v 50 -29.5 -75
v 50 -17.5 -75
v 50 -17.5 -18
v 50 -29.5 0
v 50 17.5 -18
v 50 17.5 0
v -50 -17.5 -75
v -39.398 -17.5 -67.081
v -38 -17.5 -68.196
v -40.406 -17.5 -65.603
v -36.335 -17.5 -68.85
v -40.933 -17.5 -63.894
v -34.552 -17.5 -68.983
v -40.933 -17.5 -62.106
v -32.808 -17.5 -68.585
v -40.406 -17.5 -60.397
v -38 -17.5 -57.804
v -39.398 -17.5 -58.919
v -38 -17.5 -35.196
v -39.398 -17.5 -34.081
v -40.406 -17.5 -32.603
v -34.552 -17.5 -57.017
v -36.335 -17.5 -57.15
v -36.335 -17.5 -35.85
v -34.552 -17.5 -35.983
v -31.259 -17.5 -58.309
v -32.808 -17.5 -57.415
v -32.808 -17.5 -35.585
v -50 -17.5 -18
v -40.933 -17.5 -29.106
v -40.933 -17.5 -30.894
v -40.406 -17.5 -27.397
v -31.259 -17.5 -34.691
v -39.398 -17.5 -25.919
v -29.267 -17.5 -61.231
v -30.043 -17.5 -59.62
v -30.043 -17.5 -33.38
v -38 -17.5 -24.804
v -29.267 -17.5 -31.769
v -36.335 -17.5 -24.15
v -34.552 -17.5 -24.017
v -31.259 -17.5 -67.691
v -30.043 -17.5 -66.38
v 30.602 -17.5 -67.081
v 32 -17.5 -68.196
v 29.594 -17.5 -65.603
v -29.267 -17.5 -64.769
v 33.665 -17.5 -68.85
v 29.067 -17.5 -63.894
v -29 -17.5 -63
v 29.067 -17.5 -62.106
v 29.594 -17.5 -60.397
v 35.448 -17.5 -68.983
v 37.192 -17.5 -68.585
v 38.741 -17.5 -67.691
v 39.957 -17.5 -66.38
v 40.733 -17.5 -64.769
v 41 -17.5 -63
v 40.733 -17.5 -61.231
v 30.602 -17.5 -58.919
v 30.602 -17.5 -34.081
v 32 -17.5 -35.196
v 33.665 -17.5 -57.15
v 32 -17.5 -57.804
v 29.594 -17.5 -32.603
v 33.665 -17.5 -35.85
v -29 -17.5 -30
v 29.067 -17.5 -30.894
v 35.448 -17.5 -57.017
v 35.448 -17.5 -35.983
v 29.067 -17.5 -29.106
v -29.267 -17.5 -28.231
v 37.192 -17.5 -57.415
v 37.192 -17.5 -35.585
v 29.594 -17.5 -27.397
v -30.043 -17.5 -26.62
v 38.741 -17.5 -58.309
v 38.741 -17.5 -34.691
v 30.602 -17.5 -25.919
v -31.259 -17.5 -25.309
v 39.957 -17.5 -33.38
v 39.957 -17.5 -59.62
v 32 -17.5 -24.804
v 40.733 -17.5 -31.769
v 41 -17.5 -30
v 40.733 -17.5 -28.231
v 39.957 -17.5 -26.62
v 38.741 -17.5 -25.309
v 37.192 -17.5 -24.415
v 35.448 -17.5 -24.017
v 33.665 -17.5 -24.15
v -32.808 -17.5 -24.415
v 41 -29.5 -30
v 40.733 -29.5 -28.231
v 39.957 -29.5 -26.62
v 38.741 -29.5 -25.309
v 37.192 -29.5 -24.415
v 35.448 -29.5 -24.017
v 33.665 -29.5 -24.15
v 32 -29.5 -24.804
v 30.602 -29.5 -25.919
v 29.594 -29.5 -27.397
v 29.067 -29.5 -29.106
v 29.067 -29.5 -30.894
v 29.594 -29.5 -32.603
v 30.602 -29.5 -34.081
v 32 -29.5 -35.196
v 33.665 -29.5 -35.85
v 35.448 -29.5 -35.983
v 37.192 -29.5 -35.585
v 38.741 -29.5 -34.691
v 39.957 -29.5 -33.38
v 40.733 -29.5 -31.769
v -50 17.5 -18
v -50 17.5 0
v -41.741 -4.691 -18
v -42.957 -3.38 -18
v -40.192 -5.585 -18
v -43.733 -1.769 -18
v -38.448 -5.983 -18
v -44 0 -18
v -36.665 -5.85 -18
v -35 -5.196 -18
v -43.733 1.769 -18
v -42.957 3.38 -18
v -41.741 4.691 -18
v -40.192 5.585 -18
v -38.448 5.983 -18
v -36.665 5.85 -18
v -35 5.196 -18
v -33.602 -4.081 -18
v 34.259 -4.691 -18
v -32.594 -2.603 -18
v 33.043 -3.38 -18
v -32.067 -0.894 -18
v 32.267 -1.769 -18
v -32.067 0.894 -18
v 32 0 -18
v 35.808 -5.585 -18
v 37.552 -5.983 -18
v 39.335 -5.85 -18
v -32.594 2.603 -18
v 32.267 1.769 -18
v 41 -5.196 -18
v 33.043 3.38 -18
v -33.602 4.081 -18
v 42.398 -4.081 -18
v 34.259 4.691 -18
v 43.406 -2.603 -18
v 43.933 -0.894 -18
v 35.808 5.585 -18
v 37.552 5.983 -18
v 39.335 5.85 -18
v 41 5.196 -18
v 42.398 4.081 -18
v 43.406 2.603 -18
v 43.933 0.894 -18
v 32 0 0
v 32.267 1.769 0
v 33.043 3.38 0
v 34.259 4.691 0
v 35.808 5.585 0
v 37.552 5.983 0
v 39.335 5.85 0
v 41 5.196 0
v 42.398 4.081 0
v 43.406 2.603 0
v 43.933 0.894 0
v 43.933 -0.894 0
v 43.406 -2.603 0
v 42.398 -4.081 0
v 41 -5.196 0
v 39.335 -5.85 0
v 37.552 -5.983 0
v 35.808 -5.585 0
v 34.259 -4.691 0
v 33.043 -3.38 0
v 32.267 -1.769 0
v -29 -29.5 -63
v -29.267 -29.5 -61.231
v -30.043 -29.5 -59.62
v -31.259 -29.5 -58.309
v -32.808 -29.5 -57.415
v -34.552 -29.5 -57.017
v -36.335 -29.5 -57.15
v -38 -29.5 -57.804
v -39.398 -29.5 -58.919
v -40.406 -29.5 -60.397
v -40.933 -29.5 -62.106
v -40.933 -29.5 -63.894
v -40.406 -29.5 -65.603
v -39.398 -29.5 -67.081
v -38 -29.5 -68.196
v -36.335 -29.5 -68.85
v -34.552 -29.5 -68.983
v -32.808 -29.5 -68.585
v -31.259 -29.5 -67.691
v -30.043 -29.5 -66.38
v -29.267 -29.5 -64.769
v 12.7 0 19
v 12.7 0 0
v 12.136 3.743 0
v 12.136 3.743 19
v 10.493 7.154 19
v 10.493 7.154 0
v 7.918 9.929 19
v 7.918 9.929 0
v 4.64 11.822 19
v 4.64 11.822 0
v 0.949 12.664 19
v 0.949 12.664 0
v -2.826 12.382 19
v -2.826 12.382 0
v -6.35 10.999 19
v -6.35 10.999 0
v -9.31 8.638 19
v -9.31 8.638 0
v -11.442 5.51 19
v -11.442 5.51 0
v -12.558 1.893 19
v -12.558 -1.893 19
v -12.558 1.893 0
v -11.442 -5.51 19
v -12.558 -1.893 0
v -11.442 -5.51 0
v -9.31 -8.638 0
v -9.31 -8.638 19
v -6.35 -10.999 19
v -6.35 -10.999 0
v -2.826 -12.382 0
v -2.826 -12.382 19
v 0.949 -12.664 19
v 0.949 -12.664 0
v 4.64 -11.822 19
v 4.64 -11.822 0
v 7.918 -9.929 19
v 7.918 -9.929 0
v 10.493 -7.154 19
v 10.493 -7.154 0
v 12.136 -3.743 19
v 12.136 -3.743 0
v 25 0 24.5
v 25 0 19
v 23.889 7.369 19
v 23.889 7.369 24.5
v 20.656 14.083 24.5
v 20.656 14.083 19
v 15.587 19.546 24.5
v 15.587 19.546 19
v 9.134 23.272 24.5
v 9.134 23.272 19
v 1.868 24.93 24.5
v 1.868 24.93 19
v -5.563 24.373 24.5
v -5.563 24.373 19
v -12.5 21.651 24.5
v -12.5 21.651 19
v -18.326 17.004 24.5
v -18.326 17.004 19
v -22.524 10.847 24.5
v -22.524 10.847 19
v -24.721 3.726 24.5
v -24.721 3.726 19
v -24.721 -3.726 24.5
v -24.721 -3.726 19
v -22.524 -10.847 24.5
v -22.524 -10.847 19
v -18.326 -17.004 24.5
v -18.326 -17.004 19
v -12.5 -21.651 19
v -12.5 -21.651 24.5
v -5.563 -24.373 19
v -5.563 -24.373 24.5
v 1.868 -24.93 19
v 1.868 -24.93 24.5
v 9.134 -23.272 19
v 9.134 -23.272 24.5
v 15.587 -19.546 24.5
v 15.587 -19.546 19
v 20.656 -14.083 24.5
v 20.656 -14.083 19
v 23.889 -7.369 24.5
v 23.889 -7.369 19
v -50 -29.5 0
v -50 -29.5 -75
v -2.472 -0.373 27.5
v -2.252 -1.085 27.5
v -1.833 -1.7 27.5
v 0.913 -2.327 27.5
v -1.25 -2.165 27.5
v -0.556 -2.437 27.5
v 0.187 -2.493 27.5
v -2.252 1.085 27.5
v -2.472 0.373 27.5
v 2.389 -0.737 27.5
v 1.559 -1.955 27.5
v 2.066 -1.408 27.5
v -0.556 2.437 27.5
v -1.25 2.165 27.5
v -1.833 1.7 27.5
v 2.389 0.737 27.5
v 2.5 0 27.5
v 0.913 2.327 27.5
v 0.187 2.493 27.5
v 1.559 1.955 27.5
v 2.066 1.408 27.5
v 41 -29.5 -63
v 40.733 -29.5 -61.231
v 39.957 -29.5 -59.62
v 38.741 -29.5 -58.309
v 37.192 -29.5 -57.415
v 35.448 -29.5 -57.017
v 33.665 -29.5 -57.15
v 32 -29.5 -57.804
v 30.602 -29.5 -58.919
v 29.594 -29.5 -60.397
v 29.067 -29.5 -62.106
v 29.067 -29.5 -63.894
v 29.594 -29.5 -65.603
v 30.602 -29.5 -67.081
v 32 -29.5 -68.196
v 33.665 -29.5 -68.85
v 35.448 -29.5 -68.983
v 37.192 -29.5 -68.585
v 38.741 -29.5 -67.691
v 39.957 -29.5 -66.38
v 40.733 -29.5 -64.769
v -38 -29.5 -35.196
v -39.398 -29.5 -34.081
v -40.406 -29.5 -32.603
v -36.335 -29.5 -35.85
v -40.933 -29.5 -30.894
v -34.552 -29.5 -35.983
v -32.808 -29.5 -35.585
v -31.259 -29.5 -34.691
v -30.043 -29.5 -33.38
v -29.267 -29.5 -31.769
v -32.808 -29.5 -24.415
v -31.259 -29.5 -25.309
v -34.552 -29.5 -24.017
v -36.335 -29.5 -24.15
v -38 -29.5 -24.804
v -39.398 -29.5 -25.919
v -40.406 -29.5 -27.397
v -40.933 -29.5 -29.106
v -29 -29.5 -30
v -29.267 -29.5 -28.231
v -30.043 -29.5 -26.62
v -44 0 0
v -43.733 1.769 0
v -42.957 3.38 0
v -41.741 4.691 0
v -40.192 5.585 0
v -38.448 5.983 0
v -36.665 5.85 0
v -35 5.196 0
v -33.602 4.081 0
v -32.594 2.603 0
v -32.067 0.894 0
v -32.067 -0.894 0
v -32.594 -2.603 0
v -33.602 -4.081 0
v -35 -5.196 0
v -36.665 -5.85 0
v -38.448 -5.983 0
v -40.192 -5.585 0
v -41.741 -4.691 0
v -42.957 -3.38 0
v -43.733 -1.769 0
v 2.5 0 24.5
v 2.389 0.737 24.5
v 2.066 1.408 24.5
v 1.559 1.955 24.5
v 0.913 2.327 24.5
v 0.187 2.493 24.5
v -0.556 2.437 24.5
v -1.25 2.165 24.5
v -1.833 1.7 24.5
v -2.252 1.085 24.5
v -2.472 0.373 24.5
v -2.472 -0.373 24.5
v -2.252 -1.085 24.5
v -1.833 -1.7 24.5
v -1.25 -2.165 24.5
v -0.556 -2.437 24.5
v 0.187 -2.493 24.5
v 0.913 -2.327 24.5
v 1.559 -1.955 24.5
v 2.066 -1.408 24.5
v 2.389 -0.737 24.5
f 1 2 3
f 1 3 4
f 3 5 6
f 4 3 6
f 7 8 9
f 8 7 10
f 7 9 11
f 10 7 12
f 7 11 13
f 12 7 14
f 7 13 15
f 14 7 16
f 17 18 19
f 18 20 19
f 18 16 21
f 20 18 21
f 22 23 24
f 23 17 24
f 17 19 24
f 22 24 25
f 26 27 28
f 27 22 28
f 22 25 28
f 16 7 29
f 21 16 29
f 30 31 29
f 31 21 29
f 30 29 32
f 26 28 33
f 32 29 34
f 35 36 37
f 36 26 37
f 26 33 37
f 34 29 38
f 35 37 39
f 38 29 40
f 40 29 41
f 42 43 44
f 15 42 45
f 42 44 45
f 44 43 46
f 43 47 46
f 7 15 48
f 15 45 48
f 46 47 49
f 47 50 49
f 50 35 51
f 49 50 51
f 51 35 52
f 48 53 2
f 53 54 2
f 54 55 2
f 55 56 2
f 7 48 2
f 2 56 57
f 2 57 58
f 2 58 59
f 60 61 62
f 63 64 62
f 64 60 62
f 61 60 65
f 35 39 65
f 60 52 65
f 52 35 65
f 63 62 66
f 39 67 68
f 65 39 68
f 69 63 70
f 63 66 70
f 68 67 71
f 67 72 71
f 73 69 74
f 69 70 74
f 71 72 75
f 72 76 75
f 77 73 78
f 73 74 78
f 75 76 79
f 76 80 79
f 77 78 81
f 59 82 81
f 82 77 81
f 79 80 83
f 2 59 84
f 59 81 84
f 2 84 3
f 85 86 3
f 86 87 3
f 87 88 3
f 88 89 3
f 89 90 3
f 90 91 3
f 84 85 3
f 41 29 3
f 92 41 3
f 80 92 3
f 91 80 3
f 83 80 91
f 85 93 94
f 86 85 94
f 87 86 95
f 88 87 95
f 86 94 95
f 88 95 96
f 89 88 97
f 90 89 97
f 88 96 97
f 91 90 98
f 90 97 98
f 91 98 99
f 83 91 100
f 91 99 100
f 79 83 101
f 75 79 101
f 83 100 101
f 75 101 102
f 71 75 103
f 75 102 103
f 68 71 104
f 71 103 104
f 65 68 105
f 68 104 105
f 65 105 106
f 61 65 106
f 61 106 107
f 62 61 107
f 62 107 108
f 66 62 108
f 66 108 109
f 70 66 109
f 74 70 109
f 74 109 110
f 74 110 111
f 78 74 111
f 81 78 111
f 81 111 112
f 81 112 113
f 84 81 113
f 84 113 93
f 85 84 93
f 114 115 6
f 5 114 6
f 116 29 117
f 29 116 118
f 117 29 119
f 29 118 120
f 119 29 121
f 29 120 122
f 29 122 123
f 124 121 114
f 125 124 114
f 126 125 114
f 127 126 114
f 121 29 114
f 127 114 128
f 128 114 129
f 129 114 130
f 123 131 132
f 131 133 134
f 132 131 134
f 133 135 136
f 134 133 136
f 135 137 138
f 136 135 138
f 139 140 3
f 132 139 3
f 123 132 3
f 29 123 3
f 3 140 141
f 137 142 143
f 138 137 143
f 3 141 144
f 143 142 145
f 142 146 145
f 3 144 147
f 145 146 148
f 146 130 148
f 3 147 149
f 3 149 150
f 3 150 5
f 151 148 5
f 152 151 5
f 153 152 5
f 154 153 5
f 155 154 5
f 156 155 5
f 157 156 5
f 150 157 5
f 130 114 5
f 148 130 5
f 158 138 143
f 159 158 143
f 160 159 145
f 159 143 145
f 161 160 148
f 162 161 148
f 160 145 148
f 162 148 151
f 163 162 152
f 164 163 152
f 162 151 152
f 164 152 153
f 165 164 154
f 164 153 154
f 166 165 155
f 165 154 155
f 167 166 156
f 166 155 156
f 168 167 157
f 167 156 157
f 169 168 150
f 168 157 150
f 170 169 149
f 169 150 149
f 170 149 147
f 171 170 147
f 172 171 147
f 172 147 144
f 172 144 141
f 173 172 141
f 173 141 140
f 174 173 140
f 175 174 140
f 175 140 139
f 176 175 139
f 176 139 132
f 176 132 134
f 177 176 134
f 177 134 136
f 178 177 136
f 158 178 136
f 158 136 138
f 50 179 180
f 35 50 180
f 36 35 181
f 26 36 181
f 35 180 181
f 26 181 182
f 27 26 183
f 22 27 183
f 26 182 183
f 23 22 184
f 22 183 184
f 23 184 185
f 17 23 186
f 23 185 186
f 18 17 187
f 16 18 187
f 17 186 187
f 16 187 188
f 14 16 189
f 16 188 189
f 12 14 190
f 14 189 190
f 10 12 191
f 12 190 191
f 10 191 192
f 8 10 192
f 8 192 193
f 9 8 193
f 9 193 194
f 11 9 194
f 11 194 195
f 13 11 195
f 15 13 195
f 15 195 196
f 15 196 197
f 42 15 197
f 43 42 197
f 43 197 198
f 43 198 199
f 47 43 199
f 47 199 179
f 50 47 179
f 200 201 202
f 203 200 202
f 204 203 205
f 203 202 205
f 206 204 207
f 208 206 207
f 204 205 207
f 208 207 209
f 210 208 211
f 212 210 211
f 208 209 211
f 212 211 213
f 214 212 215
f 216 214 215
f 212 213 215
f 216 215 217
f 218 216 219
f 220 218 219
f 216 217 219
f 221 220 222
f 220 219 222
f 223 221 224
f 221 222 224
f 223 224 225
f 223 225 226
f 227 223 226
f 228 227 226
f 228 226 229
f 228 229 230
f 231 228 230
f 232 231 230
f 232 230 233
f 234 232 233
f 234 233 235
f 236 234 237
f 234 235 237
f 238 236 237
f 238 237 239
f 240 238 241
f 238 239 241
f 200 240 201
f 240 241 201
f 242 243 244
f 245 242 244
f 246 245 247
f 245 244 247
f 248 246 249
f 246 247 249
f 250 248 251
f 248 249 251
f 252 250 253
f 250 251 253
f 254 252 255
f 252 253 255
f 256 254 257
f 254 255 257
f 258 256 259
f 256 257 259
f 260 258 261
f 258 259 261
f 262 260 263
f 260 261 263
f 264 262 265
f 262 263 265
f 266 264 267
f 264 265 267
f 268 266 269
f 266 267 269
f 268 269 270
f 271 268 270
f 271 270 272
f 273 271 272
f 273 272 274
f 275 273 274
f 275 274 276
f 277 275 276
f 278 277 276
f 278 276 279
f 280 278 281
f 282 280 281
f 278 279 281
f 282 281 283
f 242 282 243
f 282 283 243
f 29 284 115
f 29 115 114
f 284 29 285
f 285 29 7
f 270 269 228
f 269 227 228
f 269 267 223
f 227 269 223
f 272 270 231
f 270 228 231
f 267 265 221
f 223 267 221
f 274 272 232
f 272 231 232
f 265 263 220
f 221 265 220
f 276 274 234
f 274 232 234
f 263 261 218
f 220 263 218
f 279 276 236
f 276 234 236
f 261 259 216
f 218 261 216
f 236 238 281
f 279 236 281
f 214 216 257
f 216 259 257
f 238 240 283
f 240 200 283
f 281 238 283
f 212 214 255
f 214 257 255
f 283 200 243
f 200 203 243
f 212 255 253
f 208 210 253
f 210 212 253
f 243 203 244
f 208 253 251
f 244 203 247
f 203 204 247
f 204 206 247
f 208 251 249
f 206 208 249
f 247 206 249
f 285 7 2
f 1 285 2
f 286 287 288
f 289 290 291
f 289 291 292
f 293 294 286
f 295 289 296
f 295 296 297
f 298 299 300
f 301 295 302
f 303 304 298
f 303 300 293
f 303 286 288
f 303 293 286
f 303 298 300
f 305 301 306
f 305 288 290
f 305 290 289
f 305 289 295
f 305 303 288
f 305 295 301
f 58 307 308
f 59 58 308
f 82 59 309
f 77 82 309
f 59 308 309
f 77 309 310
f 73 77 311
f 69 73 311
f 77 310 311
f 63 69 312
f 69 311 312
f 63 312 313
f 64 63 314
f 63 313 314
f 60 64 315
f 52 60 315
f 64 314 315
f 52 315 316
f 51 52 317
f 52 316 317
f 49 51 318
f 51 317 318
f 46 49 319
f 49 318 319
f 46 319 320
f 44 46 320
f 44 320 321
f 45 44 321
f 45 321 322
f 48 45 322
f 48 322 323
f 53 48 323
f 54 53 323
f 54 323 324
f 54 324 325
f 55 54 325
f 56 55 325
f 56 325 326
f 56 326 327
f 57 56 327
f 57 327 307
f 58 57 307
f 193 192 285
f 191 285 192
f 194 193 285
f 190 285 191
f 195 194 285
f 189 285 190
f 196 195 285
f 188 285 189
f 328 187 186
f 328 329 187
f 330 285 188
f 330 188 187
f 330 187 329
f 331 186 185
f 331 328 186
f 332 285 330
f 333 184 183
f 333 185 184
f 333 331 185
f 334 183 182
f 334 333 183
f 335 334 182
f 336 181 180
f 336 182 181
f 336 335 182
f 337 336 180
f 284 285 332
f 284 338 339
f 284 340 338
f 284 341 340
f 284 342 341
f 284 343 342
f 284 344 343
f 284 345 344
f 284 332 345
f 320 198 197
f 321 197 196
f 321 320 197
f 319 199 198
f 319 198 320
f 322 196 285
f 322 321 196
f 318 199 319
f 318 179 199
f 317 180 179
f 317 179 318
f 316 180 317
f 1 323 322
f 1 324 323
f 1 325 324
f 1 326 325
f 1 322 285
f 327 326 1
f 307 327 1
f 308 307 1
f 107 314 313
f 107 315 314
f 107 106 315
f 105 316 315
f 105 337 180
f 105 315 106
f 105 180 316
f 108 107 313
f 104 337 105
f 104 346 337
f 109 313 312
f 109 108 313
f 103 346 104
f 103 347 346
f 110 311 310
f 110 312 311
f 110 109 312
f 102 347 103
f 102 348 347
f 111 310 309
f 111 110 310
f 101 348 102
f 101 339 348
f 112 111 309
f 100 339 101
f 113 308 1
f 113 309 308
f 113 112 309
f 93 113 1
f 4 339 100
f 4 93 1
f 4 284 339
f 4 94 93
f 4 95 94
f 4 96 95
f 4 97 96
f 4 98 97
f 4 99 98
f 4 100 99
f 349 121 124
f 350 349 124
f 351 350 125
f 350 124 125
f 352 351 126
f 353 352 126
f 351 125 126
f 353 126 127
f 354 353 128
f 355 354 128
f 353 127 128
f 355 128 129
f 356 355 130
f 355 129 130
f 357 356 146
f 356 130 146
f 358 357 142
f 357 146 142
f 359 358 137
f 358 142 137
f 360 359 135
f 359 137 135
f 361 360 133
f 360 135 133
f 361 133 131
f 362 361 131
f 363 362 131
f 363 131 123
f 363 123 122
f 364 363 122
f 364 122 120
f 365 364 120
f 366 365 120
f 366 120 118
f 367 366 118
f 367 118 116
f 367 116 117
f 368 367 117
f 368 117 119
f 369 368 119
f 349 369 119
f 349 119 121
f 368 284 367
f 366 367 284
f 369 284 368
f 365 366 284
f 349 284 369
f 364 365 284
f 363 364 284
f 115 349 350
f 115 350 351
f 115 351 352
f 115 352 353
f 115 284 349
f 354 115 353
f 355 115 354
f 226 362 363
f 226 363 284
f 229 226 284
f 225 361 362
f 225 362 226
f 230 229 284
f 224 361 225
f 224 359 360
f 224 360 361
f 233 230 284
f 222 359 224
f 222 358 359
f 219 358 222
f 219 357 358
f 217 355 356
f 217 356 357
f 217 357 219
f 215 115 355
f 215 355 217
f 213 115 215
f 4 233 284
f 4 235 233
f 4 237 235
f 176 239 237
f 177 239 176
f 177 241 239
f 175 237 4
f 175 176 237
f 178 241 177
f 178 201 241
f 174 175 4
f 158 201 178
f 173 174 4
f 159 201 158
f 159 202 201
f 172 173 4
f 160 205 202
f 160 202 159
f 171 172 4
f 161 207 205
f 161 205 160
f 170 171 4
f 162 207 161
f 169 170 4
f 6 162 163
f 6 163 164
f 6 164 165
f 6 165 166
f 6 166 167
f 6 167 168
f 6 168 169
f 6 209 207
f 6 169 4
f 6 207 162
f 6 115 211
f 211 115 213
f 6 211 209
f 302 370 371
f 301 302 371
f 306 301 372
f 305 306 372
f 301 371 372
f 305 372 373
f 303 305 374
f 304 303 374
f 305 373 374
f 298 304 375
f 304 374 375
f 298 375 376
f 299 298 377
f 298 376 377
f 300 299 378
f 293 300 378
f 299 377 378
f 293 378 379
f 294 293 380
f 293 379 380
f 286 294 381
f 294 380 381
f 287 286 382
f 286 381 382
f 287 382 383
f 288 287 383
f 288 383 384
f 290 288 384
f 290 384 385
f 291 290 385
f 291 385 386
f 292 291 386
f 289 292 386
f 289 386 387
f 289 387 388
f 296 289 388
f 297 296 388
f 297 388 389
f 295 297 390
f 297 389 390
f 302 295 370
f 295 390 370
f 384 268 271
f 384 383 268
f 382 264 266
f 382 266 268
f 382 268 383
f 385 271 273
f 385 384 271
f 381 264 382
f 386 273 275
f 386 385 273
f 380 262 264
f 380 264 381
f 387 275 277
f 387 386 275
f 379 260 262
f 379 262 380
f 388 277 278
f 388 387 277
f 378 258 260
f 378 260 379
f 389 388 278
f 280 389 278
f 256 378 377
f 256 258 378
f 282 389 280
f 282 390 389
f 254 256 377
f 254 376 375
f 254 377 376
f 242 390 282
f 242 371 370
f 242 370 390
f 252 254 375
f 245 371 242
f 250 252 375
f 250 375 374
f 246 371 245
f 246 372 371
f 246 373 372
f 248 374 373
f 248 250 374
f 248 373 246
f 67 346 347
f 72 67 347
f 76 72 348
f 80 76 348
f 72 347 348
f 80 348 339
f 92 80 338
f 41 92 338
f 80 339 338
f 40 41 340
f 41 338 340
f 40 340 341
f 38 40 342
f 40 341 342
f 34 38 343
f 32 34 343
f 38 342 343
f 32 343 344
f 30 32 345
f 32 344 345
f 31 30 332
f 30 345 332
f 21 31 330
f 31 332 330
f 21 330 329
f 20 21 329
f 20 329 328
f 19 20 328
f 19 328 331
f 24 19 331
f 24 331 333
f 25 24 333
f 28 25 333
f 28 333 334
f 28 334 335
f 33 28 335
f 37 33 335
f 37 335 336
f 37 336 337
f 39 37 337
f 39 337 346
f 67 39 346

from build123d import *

# Parameters (mm, degrees)
F0_W      = 100
F0_H      = 35
F1_DEPTH  = 18
F3_D      = 12
F4_R      = 12.7
F5_DEPTH  = 19
F6_R      = 25
F6_R_2    = 12.7
F7_DEPTH  = 5.5
F8_R      = 2.5
F9_DEPTH  = 3
F10_W     = 100
F10_H     = 57
F10_H_2   = 18
F11_DEPTH = 12
F13_D     = 12


with BuildPart() as f1:
    # F0 (on Top) → F1 (new body)
    with BuildSketch(Plane.XY):
        Rectangle(F0_W, F0_H)
    extrude(amount=-F1_DEPTH)

    # F3 (through all)
    with Locations(Plane.XY):
        with Locations((-38, 0), (38, 0)):
            Hole(F3_D / 2)

    # F4 (on face) → F5 (join)
    with BuildSketch(Plane.XY):
        Circle(F4_R)
    extrude(amount=F5_DEPTH)

    # F6 (on face) → F7 (join)
    with BuildSketch(Plane.XY.offset(19)):
        Circle(F6_R)
        Circle(F6_R_2, mode=Mode.SUBTRACT)
        Circle(F6_R_2)
    extrude(amount=F7_DEPTH)

    # F8 (on face) → F9 (join)
    with BuildSketch(Plane.XY.offset(24.5)):
        Circle(F8_R)
    extrude(amount=F9_DEPTH)

    # F10 (on face) → F11 (join)
    with BuildSketch(Plane.XZ.offset(17.5)):
        with Locations((0, -46.5)):
            Rectangle(F10_W, F10_H)
        with Locations((0, -9)):
            Rectangle(F10_W, F10_H_2)
    extrude(amount=F11_DEPTH)

    # F13 (through all)
    with Locations(Plane(origin=(0, -17.5, 0), x_dir=(-1, 0, 0), z_dir=(0, 1, 0))):
        with Locations((-35, -30), (-35, -63), (35, -63), (35, -30)):
            Hole(F13_D / 2)


solid = f1.part
